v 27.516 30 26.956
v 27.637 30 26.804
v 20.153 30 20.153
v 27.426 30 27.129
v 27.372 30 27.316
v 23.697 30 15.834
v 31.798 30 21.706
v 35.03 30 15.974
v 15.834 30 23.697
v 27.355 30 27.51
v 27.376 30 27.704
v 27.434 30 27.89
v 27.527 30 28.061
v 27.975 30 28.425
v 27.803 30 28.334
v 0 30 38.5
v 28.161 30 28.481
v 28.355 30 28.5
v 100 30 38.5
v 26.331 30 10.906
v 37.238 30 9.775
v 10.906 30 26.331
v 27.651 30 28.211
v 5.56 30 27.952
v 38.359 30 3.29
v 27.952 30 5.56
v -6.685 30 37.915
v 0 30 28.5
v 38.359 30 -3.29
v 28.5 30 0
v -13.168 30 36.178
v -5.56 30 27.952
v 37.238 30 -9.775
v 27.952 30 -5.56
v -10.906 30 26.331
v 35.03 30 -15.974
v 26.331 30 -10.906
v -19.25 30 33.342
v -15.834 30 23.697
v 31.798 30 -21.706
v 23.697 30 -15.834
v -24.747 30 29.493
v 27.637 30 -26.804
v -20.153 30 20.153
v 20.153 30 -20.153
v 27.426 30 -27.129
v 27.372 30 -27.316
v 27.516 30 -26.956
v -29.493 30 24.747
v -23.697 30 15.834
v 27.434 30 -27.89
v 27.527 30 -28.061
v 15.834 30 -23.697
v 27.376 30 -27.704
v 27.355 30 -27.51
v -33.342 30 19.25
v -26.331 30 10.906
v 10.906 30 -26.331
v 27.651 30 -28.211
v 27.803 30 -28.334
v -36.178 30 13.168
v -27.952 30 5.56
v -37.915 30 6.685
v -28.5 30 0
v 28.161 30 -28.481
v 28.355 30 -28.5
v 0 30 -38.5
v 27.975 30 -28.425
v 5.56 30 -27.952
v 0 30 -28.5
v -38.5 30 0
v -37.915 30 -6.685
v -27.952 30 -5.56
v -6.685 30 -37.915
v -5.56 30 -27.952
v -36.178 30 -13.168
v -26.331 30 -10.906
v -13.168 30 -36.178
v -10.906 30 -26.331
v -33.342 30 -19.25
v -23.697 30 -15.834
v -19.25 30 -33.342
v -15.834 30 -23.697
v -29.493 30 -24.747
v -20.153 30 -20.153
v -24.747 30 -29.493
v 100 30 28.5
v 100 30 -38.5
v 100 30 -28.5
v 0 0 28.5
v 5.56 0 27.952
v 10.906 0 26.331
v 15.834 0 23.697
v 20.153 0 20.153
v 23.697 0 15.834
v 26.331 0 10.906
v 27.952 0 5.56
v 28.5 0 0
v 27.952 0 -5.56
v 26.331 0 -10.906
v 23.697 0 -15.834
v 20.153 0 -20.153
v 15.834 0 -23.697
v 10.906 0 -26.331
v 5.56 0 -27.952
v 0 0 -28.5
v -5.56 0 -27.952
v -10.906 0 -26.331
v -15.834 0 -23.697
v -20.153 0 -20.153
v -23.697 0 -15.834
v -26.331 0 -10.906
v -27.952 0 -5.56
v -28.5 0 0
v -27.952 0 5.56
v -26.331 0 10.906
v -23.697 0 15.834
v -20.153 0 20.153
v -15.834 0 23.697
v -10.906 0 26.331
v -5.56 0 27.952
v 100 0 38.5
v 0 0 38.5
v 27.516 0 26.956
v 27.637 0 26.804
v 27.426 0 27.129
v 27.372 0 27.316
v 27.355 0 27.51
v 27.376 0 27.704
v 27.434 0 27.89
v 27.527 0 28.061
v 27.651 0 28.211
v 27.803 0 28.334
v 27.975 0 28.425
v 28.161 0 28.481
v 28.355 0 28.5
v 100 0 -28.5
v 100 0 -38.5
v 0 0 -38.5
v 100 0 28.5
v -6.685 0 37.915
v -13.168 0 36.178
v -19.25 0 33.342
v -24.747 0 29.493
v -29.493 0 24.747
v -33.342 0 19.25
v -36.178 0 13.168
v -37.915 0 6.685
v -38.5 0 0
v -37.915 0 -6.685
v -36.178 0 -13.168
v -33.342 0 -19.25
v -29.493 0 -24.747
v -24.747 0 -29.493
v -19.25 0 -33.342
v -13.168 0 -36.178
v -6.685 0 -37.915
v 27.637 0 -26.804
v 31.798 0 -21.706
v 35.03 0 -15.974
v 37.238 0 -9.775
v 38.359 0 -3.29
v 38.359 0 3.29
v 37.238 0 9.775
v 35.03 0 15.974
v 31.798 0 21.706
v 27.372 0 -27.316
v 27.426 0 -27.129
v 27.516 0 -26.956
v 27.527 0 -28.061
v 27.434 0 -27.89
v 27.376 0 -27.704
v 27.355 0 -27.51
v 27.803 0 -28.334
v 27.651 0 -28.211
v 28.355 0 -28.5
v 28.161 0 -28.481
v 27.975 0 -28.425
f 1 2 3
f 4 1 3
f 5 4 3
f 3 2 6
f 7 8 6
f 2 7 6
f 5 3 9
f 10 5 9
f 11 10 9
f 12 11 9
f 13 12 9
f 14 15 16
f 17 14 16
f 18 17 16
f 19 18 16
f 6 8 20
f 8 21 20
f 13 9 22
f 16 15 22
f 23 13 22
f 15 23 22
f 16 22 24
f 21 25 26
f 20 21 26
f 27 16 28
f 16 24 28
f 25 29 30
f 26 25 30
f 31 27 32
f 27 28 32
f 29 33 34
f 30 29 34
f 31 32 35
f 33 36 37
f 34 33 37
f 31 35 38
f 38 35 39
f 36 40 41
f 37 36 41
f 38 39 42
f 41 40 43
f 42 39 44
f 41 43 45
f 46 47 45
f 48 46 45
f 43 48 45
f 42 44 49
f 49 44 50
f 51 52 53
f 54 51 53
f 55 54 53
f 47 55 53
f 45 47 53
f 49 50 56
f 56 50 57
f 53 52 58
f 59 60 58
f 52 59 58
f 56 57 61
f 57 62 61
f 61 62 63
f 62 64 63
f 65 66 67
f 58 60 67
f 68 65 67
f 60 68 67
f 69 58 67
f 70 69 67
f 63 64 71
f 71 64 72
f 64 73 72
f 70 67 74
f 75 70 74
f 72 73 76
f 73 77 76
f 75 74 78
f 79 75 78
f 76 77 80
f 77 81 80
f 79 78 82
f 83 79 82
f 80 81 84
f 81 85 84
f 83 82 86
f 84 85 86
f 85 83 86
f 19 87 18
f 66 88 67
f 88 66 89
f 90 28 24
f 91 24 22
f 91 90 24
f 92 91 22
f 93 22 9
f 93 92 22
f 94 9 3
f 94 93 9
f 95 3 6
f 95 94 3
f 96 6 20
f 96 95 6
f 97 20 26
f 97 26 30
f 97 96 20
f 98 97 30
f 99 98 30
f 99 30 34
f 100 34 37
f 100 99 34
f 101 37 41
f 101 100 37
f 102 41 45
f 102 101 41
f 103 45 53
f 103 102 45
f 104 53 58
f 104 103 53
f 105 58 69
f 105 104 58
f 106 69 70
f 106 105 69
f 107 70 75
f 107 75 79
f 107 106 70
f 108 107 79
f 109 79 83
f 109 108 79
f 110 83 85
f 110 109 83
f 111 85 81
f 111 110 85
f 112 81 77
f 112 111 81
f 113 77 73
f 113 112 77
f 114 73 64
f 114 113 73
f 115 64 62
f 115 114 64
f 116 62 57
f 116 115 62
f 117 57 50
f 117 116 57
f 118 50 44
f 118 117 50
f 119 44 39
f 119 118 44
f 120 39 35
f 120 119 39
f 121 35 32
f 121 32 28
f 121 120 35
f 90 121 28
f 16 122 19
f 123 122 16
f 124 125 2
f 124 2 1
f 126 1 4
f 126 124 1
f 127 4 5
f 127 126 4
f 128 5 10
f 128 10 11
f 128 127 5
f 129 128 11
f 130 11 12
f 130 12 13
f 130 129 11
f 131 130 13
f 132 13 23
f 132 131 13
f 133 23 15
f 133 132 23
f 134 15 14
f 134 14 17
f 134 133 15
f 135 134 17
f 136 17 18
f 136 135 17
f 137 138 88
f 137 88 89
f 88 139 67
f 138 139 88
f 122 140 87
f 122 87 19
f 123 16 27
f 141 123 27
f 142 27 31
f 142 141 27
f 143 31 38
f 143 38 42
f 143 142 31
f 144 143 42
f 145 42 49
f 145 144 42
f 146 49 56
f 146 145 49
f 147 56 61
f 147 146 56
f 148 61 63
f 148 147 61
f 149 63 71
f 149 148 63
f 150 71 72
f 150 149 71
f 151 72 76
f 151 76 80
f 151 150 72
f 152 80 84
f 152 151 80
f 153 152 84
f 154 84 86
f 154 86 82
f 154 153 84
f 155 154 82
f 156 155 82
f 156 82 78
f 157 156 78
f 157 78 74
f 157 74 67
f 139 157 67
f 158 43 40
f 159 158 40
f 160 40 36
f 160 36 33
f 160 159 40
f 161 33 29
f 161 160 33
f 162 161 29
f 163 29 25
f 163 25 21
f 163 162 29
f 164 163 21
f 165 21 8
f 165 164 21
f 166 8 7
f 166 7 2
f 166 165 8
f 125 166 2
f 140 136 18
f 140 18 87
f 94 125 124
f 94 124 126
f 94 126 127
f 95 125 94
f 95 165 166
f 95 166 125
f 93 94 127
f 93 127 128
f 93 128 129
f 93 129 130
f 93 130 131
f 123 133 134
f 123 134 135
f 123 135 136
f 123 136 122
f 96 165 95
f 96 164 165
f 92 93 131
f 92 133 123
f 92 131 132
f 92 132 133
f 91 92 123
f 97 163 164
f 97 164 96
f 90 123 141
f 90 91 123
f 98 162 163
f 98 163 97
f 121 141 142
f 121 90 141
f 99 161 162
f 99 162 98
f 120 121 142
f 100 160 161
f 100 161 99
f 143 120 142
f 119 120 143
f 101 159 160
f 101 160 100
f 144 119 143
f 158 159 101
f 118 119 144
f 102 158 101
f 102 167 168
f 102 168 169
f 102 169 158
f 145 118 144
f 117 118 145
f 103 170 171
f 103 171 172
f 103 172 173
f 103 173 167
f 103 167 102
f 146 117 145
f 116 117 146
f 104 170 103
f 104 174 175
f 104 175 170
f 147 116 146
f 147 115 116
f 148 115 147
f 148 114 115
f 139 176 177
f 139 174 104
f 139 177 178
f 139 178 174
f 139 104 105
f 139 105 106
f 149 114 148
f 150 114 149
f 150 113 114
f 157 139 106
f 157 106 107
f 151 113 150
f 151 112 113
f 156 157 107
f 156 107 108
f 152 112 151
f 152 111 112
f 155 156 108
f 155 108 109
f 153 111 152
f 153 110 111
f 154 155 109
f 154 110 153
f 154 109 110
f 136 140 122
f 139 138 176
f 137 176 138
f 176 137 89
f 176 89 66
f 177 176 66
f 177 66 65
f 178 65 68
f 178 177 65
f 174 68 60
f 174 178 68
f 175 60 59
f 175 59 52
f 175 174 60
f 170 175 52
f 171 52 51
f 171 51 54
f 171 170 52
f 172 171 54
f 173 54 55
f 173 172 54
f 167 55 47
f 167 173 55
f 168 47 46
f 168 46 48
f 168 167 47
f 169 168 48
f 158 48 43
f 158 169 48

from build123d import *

# Parameters (mm, degrees)
SKETCH_1_R      = 28.5
EXTRUDE_1_DEPTH = 30


with BuildPart() as part:
    # 草图1 → 凸台-拉伸1 (new body)
    with BuildSketch(Plane(origin=(0, 0, 0), x_dir=(1, 0, 0), z_dir=(0, 1, 0))):
        with BuildLine():
            Line((28.354893758, -28.5), (100, -28.5))
            Line((100, -28.5), (100, -38.5))
            Line((100, -38.5), (0, -38.5))
            ThreePointArc((0, -38.5), (-38.5, 0), (0, 38.5))
            Line((0, 38.5), (100, 38.5))
            Line((100, 38.5), (100, 28.5))
            Line((100, 28.5), (28.354893758, 28.5))
            ThreePointArc((28.354893758, 28.5), (27.433969621, 27.889741881), (27.637048346, 26.803797468))
            ThreePointArc((27.637048346, 26.803797468), (38.5, 0), (27.637048346, -26.803797468))
            ThreePointArc((27.637048346, -26.803797468), (27.433969621, -27.889741881), (28.354893758, -28.5))
        make_face()
        with Locations(Location((0, 0, 0), (0, 0, 270))):
            Circle(SKETCH_1_R, mode=Mode.SUBTRACT)
    extrude(amount=EXTRUDE_1_DEPTH)


solid = part.part
